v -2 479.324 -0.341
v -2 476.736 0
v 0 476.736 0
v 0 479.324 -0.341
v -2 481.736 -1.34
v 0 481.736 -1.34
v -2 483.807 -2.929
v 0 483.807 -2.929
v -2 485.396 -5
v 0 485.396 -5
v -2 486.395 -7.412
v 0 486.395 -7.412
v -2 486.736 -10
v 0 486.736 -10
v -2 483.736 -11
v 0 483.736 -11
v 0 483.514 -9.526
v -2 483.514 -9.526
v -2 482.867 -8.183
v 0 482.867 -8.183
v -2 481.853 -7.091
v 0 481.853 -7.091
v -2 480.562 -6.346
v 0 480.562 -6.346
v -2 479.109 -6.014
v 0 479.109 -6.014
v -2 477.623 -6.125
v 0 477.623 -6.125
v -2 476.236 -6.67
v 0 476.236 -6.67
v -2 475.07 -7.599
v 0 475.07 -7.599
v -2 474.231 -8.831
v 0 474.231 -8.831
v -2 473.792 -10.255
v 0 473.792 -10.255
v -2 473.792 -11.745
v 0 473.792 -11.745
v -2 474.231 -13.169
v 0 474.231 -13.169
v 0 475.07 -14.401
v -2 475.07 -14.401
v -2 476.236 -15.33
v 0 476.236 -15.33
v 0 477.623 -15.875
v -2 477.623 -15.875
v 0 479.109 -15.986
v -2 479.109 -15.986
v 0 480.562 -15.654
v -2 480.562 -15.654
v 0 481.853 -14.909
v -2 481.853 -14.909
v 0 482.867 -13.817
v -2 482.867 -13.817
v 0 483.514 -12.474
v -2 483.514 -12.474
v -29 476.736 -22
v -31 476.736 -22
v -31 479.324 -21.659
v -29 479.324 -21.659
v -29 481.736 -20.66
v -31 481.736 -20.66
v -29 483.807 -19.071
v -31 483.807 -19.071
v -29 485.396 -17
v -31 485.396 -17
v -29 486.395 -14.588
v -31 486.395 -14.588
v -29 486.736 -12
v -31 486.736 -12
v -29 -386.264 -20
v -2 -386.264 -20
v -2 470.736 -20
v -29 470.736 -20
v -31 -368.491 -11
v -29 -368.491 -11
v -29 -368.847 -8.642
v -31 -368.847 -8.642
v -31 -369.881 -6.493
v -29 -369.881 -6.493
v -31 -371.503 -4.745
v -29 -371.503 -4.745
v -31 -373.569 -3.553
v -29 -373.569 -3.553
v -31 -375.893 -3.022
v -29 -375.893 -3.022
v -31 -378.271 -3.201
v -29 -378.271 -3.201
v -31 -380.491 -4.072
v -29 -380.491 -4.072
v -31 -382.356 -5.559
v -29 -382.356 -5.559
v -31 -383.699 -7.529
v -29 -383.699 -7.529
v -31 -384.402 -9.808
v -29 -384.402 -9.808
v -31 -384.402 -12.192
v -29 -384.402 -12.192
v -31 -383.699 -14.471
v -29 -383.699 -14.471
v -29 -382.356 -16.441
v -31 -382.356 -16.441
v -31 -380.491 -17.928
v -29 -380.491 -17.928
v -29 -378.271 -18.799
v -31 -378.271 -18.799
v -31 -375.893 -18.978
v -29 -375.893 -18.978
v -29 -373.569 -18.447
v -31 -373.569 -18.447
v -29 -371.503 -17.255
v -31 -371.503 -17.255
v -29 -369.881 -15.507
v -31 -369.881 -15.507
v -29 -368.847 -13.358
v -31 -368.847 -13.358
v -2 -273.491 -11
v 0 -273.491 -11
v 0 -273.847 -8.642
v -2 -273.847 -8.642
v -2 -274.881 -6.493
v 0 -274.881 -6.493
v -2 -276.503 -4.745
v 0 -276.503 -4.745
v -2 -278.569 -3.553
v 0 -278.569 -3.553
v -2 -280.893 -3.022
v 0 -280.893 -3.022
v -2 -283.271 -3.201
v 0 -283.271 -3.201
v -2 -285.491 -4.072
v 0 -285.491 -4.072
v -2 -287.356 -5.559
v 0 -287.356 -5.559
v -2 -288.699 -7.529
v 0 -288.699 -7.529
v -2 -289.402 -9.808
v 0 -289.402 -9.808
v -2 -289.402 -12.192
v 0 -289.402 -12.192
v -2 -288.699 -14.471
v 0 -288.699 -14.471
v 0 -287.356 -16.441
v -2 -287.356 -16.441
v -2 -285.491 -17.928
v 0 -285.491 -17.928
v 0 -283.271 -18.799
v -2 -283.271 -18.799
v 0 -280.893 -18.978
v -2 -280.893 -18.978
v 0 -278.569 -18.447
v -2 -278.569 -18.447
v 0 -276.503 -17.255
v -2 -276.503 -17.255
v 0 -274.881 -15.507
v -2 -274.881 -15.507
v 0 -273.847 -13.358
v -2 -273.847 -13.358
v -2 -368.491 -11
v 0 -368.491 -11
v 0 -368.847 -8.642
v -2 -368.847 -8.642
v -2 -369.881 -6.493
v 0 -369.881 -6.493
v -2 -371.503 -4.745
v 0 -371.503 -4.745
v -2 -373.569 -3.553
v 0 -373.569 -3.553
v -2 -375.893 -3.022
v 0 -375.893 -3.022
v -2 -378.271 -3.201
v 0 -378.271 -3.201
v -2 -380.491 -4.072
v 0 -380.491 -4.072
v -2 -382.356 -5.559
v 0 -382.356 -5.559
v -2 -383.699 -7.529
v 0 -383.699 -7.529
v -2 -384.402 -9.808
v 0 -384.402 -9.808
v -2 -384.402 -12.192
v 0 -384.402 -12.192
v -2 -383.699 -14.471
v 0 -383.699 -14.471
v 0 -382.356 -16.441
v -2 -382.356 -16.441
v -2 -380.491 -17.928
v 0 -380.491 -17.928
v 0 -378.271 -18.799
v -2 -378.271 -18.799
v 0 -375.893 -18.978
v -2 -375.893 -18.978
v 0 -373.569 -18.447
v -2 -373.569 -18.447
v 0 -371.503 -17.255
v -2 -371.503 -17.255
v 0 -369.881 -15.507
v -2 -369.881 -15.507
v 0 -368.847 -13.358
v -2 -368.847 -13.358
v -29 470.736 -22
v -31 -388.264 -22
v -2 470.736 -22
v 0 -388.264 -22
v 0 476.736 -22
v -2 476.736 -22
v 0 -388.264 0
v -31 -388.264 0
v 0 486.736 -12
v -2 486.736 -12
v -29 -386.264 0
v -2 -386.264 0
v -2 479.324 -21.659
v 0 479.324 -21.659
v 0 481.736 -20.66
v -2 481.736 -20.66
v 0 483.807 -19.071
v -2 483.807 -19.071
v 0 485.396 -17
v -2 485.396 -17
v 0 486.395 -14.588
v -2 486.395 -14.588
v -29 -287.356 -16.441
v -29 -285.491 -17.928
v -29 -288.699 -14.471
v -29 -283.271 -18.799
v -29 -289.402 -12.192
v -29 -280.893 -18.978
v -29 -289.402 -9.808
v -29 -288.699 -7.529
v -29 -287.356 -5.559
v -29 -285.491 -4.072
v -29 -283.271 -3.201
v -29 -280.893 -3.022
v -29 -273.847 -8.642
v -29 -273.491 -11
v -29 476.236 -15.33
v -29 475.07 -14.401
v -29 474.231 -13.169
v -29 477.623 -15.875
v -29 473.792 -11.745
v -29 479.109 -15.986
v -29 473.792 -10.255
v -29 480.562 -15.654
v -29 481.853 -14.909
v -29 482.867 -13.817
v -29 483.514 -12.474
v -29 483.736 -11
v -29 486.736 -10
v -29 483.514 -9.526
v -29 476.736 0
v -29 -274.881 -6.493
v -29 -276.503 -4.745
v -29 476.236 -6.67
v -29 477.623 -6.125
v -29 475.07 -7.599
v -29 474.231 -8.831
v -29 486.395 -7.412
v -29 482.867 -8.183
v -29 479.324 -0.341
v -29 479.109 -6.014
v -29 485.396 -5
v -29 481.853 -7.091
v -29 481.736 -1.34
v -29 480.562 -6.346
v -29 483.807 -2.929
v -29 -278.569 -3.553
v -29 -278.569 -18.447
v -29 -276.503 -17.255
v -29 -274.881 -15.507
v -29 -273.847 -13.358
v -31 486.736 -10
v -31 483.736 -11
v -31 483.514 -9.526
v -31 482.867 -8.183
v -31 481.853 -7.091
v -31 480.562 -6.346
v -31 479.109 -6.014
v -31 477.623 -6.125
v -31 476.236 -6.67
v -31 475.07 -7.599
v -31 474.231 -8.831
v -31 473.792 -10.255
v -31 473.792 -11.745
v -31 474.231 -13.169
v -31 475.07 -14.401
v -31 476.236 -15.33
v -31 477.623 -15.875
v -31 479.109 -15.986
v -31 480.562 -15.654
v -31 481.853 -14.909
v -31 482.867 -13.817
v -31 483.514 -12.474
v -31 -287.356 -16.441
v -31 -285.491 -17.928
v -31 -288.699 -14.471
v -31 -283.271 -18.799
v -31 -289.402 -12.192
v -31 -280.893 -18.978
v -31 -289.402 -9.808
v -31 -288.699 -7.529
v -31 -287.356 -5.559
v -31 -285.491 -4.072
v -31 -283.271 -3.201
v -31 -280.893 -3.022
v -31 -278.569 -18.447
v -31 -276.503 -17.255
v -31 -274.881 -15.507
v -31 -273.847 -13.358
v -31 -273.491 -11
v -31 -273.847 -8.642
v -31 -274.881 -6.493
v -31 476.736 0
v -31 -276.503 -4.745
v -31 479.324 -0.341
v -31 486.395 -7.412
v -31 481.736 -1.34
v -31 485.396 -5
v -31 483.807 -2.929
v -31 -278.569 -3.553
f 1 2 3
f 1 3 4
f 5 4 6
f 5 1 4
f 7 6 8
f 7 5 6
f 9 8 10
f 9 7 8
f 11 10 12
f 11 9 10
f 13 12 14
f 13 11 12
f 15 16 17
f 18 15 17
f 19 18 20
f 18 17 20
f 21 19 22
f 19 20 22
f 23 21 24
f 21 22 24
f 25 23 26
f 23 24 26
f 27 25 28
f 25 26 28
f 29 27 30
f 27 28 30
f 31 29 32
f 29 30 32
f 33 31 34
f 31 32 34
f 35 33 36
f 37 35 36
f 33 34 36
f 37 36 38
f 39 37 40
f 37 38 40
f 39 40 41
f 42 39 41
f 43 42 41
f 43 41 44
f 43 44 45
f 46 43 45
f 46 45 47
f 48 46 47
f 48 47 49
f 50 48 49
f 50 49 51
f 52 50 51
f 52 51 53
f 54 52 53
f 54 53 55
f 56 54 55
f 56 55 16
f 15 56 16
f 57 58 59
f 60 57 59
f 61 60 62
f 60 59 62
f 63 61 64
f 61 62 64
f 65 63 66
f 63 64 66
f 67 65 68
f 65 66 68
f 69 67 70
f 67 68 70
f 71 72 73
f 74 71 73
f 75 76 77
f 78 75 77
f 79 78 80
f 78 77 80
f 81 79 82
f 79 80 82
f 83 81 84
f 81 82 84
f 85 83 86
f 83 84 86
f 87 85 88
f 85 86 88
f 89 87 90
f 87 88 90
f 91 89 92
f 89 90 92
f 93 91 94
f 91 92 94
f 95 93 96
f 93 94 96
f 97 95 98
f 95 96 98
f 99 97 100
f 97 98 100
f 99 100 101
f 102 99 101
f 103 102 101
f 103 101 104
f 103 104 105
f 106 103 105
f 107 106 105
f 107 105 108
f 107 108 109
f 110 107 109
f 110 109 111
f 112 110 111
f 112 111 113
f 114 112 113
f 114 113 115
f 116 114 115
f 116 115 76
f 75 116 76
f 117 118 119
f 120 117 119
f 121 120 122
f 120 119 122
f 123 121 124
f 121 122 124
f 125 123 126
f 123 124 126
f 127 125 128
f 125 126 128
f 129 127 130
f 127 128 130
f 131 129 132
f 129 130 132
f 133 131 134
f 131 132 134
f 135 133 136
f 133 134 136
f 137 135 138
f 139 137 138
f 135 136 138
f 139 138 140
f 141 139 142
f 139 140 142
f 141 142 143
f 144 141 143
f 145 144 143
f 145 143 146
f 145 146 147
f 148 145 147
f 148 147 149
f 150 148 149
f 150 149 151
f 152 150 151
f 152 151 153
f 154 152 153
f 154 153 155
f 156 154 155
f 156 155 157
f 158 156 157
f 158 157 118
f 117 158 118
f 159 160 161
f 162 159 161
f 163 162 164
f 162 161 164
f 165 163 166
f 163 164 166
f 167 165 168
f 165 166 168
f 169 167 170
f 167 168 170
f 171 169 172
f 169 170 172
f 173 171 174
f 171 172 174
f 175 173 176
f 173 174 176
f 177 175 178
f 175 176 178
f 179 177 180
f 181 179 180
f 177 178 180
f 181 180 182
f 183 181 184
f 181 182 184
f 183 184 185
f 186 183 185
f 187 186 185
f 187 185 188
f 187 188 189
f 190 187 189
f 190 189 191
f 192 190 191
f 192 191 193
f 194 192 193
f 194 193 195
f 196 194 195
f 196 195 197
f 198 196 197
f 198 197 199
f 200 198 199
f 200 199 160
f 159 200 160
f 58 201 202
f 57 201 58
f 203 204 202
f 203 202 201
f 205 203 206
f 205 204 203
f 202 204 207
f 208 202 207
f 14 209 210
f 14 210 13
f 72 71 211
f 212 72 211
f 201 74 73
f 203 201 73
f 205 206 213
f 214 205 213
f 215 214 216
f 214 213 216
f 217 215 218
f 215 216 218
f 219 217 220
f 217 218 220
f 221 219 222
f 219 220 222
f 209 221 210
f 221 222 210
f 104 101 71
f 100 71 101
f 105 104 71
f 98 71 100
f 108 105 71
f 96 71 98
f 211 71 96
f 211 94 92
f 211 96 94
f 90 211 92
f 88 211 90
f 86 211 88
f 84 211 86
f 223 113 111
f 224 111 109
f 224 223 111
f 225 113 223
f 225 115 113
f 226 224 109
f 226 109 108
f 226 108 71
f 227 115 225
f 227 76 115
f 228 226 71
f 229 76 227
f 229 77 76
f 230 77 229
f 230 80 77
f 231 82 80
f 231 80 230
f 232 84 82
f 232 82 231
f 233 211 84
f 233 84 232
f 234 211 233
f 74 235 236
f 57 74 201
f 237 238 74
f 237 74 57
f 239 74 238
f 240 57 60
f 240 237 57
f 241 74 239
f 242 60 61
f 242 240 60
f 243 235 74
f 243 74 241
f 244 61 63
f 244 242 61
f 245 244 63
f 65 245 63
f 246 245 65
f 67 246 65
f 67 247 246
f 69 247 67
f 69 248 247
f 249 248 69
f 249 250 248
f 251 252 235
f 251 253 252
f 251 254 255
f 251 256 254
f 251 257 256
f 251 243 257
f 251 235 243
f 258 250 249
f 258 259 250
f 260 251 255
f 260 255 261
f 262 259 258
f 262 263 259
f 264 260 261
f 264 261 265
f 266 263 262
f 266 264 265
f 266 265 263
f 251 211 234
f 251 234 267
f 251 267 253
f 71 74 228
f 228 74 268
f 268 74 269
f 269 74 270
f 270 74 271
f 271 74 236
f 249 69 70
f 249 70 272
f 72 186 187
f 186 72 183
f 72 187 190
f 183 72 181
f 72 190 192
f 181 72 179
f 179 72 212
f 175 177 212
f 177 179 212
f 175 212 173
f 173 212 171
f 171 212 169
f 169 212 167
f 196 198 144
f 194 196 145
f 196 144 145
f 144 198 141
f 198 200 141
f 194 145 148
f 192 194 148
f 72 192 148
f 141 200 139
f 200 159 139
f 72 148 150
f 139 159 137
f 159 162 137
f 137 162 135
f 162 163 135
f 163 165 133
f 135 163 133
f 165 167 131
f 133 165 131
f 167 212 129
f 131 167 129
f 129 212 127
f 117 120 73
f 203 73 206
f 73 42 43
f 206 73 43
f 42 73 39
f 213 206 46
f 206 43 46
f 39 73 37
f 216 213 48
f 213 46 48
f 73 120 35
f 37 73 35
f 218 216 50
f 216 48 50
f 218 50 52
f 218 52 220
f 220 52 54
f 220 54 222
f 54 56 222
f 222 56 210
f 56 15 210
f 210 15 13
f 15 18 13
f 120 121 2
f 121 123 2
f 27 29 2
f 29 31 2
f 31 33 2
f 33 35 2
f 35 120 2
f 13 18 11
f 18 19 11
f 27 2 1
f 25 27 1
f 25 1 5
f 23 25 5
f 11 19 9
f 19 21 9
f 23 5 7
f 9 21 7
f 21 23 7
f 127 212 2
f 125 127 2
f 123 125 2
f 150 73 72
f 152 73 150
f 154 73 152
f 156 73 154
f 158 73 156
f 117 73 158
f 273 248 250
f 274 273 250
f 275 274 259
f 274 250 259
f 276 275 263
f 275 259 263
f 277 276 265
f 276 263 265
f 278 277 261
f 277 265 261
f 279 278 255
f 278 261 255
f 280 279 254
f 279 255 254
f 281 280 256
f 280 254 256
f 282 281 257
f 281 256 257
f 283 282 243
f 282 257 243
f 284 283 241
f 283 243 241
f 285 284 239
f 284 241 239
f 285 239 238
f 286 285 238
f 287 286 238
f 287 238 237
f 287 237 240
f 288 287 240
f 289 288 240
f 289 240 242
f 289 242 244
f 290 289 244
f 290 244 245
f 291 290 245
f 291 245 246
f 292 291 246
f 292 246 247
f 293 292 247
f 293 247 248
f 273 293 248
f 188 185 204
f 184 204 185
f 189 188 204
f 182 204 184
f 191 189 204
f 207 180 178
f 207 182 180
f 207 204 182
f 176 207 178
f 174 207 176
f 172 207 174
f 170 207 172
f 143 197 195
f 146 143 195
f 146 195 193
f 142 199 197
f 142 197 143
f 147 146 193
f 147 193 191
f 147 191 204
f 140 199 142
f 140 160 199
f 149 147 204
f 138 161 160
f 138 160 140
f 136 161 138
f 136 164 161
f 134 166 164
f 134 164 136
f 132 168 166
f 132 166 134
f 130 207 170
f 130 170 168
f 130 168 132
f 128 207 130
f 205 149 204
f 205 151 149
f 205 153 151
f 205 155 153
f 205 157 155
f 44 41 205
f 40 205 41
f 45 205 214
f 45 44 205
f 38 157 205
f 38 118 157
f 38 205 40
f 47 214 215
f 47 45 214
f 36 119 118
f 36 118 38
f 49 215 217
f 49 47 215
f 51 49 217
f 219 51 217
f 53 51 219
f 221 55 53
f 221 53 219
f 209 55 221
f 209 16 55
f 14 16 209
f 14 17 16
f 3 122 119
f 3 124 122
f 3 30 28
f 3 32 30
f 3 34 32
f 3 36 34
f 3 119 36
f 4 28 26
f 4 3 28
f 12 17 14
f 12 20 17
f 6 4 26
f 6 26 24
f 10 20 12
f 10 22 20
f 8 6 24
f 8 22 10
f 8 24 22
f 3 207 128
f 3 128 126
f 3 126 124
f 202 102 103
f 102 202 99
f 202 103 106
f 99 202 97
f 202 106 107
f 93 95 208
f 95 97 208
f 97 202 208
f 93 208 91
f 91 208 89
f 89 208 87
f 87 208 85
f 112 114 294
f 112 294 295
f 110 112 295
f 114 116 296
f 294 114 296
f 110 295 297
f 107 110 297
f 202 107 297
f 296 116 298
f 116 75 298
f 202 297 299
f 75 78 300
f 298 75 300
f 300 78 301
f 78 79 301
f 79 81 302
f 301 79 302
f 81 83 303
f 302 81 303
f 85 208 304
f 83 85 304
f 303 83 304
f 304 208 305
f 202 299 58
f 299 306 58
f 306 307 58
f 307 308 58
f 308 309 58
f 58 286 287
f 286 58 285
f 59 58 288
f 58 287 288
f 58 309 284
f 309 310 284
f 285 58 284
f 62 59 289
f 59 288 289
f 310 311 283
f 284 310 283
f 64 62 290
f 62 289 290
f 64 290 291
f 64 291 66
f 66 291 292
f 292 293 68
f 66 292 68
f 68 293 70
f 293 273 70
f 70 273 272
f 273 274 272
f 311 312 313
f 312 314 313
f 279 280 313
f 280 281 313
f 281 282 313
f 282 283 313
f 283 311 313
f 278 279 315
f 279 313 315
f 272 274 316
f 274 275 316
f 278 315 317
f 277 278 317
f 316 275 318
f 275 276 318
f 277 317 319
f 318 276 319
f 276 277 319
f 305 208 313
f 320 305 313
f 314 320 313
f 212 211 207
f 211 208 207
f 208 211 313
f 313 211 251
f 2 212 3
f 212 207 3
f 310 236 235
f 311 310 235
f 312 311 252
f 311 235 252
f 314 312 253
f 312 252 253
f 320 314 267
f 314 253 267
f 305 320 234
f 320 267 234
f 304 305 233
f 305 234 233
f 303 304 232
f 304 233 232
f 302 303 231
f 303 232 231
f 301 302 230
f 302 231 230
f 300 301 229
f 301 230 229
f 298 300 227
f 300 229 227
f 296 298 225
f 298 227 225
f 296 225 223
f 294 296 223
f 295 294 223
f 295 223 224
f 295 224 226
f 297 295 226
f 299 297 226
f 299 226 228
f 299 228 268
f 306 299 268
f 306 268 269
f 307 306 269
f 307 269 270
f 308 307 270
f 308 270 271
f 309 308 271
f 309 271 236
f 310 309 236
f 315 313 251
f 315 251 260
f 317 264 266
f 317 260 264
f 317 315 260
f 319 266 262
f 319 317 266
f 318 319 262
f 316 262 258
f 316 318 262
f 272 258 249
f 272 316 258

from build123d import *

# Parameters (mm, degrees)
F0_W      = 875
F0_H      = 22
F1_DEPTH  = 31
F2_T      = -2
F3_R      = 5
F4_DEPTH  = 61
F5_W      = 16
F5_H      = 16
F6_DEPTH  = 46
F7_R      = 8
F8_DEPTH  = 96
F9_R      = 10
F10_W     = 27
F10_H     = 21.5130257002
F11_DEPTH = 25
F12_W     = 27
F12_H     = 18.3594822884
F13_DEPTH = 25


with BuildPart() as f1:
    # F0 (on Right) → F1 (new body)
    with BuildSketch(Plane.YZ):
        with Locations((49.2357180723, -11)):
            Rectangle(F0_W, F0_H)
    extrude(amount=-F1_DEPTH)

    # F2
    f2_openings = [f1.faces().sort_by_distance(p)[0] for p in [
        (-15.5, 49.235718, 0),
    ]]
    offset(amount=F2_T, openings=f2_openings)

    # F3 (on face) → F4 (cut)
    with BuildSketch(Plane.YZ):
        with Locations((478.7357180723, -11)):
            Circle(F3_R)
    extrude(amount=-F4_DEPTH, mode=Mode.SUBTRACT)

    # F5 (on face) → F6 (cut)
    with BuildSketch(Plane.XY):
        with Locations((-18, 478.7357180723)):
            Rectangle(F5_W, F5_H)
    extrude(amount=-F6_DEPTH, mode=Mode.SUBTRACT)

    # F7 (on face) → F8 (cut)
    with BuildSketch(Plane.YZ):
        with Locations((-376.4913082123, -11)):
            Circle(F7_R)
        with Locations((-281.4913082123, -11)):
            Circle(F7_R)
    extrude(amount=-F8_DEPTH, mode=Mode.SUBTRACT)

    # F9
    f9_edges = [f1.edges().sort_by_distance(p)[0] for p in [
        (-5, 486.735718, 0),
        (-28.5, 486.735718, 0),
        (-6, 484.735718, -20),
        (-5, 486.735718, -22),
        (-27.5, 484.735718, -20),
        (-28.5, 486.735718, -22),
    ]]
    fillet(f9_edges, radius=F9_R)

    # F10 (on face) → F11 (cut)
    with BuildSketch(Plane.XY.offset(-20)):
        with Locations((-15.5, 481.4922309224)):
            Rectangle(F10_W, F10_H)
    extrude(amount=-F11_DEPTH, mode=Mode.SUBTRACT)

    # F12 (on face) → F13 (cut)
    with BuildSketch(Plane.XY.offset(-20)):
        with Locations((-15.5, 482.3970198631)):
            Rectangle(F12_W, F12_H)
    extrude(amount=F13_DEPTH, mode=Mode.SUBTRACT)


solid = f1.part
